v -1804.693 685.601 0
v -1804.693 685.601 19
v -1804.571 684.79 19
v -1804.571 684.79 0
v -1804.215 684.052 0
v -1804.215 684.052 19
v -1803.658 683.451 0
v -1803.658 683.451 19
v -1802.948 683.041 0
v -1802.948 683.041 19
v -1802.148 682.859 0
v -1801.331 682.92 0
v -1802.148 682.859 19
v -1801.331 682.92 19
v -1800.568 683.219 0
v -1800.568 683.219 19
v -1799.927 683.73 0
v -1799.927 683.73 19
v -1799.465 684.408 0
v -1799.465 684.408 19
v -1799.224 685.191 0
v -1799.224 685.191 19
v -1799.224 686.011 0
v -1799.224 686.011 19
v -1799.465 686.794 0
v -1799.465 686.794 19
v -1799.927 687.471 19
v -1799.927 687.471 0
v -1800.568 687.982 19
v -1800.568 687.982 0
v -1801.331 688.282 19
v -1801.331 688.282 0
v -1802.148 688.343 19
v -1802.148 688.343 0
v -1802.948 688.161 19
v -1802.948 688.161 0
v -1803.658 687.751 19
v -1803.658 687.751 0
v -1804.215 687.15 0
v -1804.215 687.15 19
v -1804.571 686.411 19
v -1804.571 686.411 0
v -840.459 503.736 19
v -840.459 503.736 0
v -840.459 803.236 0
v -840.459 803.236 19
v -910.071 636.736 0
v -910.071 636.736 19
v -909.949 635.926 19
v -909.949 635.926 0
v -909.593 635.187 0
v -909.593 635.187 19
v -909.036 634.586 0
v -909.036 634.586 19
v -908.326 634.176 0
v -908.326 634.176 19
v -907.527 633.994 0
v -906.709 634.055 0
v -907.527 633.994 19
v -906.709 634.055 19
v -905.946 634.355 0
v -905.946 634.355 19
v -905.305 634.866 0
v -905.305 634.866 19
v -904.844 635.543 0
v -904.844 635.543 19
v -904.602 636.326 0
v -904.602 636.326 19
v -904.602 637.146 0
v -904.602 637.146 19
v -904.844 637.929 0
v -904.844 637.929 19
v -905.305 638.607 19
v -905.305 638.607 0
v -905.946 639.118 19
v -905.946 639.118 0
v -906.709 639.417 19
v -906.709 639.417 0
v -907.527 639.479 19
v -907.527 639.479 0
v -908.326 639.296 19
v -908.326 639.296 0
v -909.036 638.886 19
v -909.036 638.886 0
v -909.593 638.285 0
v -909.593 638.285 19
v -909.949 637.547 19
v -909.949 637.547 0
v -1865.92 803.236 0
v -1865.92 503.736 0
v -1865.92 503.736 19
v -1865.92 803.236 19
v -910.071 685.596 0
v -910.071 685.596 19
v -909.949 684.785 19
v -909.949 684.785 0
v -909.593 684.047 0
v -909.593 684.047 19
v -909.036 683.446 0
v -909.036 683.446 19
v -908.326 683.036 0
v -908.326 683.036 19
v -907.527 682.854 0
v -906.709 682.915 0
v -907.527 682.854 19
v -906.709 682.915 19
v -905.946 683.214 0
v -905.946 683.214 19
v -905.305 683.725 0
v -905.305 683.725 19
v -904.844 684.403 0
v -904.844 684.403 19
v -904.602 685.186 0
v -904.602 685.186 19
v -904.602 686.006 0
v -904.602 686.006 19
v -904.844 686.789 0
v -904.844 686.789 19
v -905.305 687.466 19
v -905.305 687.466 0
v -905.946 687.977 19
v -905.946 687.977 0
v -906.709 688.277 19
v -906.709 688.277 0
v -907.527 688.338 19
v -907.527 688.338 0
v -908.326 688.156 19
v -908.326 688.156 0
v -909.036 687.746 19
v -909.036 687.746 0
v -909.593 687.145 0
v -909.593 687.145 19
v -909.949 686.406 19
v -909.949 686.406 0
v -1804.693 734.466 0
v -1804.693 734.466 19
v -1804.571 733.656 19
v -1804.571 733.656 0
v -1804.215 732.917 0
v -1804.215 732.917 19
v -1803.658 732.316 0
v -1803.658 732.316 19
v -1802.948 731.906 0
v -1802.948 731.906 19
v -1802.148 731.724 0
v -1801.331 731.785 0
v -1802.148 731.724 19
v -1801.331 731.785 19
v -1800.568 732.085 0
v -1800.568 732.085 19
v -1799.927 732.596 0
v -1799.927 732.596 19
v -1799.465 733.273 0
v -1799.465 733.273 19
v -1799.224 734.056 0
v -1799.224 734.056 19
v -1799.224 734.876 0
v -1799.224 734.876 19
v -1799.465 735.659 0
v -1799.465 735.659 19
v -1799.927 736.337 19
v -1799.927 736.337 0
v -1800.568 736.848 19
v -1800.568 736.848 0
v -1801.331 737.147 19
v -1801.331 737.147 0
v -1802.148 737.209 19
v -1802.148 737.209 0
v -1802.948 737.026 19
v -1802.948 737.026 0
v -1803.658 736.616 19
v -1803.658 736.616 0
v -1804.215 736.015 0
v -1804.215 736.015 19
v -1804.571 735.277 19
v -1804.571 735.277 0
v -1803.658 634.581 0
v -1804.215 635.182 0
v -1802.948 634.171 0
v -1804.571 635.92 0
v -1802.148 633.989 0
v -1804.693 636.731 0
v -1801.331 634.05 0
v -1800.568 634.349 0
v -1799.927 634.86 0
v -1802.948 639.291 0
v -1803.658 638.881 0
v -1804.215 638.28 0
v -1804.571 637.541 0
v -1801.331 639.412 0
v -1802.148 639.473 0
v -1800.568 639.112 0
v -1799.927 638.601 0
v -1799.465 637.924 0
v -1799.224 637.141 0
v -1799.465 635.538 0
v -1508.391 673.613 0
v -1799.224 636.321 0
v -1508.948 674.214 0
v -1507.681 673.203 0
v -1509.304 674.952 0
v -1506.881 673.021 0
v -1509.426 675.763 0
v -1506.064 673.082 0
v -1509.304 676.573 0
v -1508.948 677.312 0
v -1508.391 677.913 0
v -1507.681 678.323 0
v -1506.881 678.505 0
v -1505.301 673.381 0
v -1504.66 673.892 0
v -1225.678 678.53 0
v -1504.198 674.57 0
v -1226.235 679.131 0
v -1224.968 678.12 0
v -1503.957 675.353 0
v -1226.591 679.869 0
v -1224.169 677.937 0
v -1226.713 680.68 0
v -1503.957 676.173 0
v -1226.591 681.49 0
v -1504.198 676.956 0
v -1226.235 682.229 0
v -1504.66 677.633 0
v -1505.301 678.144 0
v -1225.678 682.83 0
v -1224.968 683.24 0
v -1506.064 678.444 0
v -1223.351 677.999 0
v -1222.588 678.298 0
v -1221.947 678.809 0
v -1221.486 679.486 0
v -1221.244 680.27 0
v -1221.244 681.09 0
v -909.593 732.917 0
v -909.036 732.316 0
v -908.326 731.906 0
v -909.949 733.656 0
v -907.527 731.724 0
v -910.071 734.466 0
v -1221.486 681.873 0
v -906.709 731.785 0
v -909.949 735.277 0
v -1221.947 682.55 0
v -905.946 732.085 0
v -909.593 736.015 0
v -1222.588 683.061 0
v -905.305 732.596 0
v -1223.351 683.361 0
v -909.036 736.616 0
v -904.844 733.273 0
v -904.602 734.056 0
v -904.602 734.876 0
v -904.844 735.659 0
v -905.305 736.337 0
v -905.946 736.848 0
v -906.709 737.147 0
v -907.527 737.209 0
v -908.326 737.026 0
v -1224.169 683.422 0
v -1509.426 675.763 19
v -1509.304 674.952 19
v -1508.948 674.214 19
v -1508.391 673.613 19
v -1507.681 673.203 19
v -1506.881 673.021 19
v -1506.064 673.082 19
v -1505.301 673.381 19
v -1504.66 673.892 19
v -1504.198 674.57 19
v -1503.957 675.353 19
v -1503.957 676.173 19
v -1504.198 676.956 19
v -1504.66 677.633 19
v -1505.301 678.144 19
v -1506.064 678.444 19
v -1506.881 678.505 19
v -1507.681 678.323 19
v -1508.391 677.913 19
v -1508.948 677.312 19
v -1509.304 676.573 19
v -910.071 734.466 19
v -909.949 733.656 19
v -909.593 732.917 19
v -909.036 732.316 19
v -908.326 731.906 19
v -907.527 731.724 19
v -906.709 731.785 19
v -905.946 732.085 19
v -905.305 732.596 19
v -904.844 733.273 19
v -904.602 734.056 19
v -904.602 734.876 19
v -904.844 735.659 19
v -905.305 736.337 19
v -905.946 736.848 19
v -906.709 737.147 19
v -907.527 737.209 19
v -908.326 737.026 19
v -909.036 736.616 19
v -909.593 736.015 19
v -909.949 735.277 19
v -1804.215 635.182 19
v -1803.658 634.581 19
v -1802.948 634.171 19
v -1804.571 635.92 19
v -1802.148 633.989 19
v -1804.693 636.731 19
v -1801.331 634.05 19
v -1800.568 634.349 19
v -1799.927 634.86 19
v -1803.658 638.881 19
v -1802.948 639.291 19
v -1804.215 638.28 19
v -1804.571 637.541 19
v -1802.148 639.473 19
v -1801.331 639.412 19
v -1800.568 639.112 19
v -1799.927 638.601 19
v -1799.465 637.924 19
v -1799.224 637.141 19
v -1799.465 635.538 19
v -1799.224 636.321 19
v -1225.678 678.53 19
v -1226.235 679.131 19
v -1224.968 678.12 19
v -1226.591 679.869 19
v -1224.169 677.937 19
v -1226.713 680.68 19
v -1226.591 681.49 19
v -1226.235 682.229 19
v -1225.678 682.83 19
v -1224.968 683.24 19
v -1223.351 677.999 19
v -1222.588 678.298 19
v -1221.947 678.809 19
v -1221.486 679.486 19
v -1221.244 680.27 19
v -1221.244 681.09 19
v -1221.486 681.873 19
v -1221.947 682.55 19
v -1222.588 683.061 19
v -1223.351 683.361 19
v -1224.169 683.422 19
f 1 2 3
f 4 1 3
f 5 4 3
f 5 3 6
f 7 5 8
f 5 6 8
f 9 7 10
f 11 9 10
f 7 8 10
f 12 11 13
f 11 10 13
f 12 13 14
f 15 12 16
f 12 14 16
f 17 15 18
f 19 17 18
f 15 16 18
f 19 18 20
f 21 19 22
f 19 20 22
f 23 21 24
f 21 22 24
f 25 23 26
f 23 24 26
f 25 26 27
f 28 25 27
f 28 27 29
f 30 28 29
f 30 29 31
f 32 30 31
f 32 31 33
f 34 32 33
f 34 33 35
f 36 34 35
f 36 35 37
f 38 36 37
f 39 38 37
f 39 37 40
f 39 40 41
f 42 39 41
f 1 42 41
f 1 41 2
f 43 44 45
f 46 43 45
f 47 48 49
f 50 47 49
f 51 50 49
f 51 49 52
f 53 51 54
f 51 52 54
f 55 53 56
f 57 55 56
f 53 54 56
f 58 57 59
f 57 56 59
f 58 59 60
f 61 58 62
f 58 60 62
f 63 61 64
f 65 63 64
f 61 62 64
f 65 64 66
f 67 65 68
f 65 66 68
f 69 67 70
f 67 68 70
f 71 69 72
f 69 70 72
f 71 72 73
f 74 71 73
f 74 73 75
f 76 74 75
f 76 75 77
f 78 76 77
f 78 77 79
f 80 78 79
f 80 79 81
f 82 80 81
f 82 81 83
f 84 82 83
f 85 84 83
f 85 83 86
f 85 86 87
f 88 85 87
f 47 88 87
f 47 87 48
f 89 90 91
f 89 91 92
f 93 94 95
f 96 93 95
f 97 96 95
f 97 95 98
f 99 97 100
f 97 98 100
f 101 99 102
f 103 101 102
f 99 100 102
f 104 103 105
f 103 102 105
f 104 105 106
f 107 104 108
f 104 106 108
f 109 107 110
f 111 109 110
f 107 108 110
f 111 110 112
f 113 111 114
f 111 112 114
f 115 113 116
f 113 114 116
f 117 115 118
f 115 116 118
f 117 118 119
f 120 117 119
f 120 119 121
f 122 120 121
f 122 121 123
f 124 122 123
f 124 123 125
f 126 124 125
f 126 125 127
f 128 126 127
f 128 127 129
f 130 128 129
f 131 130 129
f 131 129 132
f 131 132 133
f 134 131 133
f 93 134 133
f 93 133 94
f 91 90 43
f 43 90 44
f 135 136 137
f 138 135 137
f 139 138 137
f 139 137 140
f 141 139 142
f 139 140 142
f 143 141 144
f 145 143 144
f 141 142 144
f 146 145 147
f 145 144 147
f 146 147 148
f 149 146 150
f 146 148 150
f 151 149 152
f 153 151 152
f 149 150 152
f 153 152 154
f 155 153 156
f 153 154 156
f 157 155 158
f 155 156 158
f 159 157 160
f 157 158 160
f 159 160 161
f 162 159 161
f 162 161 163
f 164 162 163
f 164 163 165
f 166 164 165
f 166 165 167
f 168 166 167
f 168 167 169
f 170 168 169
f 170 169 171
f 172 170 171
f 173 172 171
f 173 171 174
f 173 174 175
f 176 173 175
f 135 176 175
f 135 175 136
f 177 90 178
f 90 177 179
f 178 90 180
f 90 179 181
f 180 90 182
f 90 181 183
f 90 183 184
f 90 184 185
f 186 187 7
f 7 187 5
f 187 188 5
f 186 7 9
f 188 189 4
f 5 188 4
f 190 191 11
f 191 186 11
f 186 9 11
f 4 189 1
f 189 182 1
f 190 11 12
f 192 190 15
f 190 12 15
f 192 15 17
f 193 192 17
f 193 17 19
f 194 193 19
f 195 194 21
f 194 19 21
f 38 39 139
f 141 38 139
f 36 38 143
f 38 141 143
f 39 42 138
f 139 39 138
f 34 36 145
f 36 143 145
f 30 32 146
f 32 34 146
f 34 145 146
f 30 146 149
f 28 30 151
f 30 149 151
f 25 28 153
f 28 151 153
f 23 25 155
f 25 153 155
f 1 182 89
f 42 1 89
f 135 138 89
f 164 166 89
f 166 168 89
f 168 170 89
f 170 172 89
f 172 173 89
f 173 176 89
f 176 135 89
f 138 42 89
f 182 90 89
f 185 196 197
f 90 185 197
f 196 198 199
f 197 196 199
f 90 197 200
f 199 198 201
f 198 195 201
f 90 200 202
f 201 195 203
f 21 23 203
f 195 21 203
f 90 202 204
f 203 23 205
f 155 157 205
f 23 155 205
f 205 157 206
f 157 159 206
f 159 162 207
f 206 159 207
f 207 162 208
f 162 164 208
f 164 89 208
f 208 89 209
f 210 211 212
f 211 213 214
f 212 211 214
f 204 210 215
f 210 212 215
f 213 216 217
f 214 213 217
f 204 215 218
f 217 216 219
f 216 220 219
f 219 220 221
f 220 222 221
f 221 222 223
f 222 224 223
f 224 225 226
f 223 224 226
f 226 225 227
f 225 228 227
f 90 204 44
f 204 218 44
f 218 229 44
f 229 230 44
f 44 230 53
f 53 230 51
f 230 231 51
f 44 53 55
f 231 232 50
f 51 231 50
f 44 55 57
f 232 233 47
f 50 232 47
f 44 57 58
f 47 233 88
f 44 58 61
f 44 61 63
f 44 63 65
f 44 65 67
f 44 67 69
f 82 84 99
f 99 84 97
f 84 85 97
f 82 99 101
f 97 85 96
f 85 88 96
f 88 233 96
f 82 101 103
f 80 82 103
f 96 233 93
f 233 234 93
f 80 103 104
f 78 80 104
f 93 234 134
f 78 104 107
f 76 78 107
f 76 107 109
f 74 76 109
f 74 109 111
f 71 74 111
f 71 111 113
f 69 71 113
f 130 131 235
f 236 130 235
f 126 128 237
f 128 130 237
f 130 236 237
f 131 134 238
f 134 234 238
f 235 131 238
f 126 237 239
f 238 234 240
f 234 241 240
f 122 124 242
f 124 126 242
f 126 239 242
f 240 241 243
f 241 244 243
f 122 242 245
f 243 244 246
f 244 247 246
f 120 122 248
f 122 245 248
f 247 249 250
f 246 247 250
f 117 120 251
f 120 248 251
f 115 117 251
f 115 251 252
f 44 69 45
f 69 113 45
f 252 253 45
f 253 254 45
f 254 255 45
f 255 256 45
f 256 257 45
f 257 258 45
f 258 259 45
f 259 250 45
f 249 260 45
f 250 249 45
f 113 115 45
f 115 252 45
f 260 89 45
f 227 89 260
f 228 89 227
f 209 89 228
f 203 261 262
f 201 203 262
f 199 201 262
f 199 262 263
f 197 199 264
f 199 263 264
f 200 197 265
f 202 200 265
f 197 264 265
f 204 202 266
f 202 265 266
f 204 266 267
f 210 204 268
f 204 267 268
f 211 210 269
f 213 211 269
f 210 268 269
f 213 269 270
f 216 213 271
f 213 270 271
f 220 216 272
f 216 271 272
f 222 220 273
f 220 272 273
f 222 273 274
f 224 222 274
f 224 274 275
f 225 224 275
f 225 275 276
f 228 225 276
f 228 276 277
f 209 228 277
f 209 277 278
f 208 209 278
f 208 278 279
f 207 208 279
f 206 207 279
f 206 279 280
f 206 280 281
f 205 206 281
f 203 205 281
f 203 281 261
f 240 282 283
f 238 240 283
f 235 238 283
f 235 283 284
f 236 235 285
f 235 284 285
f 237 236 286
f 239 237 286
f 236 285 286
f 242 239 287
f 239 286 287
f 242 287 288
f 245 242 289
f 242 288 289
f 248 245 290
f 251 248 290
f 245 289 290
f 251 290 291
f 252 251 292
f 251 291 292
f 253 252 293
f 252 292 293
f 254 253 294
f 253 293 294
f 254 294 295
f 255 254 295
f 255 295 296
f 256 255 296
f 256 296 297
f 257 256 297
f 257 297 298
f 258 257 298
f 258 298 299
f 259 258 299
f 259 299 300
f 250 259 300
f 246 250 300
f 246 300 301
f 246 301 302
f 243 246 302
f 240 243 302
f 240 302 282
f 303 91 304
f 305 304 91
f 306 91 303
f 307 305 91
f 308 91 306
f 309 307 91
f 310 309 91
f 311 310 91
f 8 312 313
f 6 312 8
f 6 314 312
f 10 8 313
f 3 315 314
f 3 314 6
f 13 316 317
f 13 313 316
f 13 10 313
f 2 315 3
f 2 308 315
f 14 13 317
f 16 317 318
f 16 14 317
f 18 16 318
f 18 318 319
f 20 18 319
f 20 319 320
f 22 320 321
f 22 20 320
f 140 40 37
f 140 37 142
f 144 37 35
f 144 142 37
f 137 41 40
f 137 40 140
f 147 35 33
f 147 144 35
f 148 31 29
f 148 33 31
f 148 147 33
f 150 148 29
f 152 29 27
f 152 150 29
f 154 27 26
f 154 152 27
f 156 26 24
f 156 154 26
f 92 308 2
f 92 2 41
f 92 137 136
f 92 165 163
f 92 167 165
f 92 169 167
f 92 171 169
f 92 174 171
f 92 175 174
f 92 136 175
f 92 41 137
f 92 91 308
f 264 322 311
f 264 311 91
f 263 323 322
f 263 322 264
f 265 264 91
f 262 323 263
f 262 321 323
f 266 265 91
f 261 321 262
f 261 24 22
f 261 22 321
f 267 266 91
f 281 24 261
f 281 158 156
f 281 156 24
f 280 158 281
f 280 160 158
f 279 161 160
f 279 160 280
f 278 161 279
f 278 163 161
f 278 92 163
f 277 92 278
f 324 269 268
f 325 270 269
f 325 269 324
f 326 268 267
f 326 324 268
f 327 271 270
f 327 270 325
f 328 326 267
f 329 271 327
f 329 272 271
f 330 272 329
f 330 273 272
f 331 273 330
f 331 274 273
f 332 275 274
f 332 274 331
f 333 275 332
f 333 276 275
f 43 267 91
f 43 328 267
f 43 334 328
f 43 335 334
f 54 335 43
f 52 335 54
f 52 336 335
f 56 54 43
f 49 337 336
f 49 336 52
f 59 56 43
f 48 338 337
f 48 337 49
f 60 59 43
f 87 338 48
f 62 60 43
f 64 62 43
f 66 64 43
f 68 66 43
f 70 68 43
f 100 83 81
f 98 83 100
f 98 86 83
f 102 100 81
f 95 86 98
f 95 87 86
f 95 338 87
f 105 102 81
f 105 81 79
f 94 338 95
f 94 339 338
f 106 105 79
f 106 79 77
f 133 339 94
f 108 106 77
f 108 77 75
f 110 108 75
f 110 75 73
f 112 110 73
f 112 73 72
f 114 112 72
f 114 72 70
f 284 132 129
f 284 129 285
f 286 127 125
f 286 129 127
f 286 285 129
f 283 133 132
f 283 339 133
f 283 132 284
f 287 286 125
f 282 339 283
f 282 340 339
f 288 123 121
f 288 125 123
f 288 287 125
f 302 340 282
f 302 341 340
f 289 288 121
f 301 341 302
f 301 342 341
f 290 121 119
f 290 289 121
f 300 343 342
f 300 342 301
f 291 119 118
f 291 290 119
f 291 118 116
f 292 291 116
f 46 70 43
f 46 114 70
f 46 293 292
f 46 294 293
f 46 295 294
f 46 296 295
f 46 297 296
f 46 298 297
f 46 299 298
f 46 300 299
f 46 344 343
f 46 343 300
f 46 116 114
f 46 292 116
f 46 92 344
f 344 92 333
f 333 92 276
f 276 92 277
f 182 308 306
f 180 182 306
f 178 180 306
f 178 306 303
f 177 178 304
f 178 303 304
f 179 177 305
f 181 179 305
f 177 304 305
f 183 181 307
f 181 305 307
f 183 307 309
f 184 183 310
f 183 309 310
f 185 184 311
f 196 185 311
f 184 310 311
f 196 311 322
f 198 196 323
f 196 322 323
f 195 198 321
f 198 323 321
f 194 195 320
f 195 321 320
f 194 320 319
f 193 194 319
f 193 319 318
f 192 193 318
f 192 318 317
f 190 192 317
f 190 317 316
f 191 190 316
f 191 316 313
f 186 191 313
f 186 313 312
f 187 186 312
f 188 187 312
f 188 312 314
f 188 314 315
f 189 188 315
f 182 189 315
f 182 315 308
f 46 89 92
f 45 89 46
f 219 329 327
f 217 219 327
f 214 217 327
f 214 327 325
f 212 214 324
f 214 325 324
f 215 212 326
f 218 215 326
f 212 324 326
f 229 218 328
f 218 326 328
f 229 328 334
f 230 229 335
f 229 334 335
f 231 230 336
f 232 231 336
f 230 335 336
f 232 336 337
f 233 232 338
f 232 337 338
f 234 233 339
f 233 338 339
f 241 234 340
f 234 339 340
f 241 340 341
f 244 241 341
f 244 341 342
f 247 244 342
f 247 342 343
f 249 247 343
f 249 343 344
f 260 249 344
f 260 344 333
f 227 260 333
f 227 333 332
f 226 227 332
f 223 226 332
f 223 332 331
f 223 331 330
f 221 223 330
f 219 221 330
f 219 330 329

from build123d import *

# Parameters (mm, degrees)
SKETCH1_W                = 1025.461280364
SKETCH1_H                = 299.5
BOSS_EXTRUDE1_DEPTH      = 19
M5_CLEARANCE_HOLE1_D     = 5.5
M5_CLEARANCE_HOLE1_DEPTH = 32.347633298
M5_CLEARANCE_HOLE1_TIP   = 1.652366702


with BuildPart() as part:
    # Sketch1 → Boss-Extrude1 (new body)
    with BuildSketch(Plane.XY):
        with Locations((-1353.189241506, 653.485981281)):
            Rectangle(SKETCH1_W, SKETCH1_H)
    extrude(amount=BOSS_EXTRUDE1_DEPTH)

    # M5 Clearance Hole1
    with Locations(Plane(origin=(-1324.198298443, -38.252881002, 0), x_dir=(1, 0, 0), z_dir=(0, 0, -1))):
        with Locations((-477.744666278, -772.719190614), (-477.744666278, -723.853749178), (-477.744666278, -674.983749963), (416.87696419, -772.719190614), (416.87696419, -723.848749963), (416.87696419, -674.989194818), (100.235099038, -718.93253129), (-182.477682784, -714.015727285)):
            Hole(M5_CLEARANCE_HOLE1_D / 2, depth=M5_CLEARANCE_HOLE1_DEPTH)
            with Locations((0, 0, -(M5_CLEARANCE_HOLE1_DEPTH + M5_CLEARANCE_HOLE1_TIP / 2))):  # 118° drill point
                Cone(0, M5_CLEARANCE_HOLE1_D / 2, M5_CLEARANCE_HOLE1_TIP, mode=Mode.SUBTRACT)


solid = part.part
